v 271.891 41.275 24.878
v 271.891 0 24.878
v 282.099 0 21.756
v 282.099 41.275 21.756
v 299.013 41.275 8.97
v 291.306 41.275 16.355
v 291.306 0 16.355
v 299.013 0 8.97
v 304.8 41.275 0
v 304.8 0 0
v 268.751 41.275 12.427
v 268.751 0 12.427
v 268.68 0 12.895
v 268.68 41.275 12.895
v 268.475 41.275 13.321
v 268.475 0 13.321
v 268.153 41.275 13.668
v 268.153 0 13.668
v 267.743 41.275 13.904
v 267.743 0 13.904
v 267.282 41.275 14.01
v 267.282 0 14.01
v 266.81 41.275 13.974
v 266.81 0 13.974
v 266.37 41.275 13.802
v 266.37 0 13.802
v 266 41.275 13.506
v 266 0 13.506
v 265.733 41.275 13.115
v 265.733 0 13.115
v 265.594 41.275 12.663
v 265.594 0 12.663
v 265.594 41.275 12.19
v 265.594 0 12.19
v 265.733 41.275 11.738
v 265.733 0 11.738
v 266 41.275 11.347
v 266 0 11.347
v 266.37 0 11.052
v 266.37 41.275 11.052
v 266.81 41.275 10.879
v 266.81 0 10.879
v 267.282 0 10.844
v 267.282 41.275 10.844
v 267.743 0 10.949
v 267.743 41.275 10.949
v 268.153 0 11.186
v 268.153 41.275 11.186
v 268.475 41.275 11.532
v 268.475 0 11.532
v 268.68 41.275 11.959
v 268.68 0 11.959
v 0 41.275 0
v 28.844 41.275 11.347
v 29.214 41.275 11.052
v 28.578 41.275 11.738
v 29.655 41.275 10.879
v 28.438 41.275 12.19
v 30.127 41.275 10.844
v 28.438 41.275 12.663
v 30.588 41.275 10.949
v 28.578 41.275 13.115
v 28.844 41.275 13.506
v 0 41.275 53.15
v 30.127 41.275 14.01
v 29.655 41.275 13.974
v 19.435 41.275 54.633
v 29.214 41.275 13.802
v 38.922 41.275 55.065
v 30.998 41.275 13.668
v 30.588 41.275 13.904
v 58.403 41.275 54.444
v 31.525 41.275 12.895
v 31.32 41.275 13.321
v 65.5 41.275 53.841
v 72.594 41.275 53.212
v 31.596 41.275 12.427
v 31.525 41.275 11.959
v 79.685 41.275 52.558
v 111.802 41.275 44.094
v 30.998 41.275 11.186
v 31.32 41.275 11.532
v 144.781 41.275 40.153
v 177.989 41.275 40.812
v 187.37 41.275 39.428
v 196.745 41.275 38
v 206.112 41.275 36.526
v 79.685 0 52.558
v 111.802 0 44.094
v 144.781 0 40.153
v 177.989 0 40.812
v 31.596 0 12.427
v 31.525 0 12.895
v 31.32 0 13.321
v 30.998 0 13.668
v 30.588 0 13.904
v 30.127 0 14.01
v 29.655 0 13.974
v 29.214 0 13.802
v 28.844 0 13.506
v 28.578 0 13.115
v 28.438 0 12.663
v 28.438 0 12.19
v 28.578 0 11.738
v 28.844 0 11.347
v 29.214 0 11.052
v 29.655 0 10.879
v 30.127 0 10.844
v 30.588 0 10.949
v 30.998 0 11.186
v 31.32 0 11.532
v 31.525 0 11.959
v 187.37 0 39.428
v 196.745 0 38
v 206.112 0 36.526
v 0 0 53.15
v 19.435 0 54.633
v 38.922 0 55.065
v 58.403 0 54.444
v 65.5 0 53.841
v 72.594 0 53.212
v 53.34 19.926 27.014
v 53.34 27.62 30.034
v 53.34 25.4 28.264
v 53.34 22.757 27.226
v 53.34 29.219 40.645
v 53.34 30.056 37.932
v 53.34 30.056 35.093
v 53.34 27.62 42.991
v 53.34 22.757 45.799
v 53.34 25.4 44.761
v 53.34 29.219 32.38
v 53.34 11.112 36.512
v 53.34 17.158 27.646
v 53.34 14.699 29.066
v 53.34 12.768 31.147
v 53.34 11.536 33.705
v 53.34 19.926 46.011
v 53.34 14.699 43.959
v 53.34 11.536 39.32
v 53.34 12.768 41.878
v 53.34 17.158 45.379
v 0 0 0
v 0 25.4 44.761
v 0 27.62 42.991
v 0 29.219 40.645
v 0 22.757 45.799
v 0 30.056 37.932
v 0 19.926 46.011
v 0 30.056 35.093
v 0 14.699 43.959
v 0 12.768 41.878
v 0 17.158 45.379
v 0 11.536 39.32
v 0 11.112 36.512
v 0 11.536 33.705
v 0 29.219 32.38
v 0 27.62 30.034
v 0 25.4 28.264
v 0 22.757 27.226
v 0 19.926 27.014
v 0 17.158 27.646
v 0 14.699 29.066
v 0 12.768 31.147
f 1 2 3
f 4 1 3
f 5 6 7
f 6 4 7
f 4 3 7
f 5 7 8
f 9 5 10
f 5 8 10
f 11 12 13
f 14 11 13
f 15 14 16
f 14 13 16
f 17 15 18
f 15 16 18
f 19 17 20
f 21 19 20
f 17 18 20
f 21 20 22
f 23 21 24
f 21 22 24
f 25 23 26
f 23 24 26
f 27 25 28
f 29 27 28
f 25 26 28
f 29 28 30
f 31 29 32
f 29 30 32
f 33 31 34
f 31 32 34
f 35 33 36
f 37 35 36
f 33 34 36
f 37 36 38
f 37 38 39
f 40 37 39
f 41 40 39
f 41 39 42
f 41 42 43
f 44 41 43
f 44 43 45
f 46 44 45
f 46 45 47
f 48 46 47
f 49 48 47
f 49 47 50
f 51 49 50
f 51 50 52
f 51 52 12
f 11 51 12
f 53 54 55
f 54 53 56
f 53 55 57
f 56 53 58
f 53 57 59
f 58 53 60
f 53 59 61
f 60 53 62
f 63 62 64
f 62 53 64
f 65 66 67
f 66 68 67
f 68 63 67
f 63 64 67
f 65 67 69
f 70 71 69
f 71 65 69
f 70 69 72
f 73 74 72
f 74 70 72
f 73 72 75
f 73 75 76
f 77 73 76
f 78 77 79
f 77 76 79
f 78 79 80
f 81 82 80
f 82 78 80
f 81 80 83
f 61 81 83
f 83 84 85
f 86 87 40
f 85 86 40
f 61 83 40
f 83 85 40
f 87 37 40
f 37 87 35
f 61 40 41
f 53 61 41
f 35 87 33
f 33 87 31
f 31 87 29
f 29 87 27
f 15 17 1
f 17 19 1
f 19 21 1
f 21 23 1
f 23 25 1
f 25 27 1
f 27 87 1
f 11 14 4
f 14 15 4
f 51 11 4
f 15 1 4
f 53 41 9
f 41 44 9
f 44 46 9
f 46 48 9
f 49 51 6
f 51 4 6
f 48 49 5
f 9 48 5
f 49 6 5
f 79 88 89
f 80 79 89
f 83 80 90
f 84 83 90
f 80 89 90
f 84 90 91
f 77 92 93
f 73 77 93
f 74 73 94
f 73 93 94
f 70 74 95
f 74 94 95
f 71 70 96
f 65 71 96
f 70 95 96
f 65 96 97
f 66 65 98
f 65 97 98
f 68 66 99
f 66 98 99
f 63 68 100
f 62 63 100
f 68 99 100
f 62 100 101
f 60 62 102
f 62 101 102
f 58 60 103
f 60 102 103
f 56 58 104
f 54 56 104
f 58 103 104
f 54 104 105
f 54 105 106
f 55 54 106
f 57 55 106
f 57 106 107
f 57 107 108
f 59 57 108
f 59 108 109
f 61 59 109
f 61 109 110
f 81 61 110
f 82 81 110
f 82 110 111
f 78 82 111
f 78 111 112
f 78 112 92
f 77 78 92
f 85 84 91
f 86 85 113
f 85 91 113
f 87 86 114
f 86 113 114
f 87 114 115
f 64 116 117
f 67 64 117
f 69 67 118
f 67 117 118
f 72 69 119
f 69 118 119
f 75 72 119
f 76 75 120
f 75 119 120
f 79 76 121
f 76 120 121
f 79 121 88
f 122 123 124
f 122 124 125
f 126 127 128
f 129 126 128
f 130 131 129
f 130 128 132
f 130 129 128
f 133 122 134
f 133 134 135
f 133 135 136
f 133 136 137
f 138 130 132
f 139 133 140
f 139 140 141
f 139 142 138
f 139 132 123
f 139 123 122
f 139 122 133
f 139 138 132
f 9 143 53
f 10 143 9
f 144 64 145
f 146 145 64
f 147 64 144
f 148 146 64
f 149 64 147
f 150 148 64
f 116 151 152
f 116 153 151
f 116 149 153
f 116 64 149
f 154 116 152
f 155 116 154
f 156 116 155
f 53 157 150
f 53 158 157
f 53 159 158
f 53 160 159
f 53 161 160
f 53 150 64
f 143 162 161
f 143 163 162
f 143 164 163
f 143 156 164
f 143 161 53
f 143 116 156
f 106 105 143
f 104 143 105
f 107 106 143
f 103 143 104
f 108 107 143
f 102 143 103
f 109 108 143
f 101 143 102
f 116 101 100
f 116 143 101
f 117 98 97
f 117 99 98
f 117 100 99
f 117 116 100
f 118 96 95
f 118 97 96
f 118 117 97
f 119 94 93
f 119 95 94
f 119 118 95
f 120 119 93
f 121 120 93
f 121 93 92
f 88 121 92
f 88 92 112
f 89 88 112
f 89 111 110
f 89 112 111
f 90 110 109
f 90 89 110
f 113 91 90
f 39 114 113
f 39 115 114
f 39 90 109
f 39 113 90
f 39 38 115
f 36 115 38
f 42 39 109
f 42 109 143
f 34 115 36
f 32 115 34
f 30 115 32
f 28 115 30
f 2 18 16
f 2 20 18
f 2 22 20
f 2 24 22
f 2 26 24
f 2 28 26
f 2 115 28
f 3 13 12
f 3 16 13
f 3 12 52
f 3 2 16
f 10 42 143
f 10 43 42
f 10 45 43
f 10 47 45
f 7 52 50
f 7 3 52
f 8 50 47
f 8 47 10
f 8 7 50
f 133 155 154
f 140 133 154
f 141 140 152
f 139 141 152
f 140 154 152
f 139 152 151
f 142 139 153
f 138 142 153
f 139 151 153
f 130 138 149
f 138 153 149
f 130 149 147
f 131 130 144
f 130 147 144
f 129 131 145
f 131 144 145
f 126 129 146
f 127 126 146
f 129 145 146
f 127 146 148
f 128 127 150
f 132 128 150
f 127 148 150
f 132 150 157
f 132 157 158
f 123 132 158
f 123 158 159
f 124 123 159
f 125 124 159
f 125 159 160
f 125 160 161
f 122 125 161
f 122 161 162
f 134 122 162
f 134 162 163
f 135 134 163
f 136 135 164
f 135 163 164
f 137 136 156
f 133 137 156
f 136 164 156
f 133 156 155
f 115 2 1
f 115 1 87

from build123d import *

# Parameters (mm, degrees)
F1_DEPTH = 41.275
F2_R     = 9.525
F3_DEPTH = 53.34
F5_DEPTH = 41.656
F7_DEPTH = 42.164
F8_R     = 1.5875
F9_DEPTH = 41.656


with BuildPart() as f1:
    # F0 (on Front) → F1 (new body)
    with BuildSketch(Plane.XZ):
        Polygon((304.8, 0), (304.8, 19.05), (0, 73.025), (0, 0), align=None)
    extrude(amount=-F1_DEPTH)

    # F2 (on face) → F3 (cut)
    with BuildSketch(Plane(origin=(0, 0, 0), x_dir=(0, -1, 0), z_dir=(-1, 0, 0))):
        with Locations((-20.6375, 36.5125)):
            Circle(F2_R)
    extrude(amount=-F3_DEPTH, mode=Mode.SUBTRACT)

    # F4 (on face) → F5 (cut)
    with BuildSketch(Plane.XZ):
        with BuildLine():
            ThreePointArc((0, 58.4309995174), (103.3439877315, 50.1875204766), (206.112158097, 36.5259720036))
            Line((206.112158097, 36.5259720036), (0, 73.025))
            Line((0, 73.025), (0, 58.4309995174))
        make_face()
        with BuildLine():
            Line((304.8, 19.05), (271.8913928646, 24.8775658469))
            ThreePointArc((271.8913928646, 24.8775658469), (291.3064644297, 16.355353839), (304.8, 0))
            Line((304.8, 0), (304.8, 19.05))
        make_face()
    extrude(amount=-F5_DEPTH, mode=Mode.SUBTRACT)

    # F6 (on face) → F7 (cut)
    with BuildSketch(Plane.XZ):
        with BuildLine():
            ThreePointArc((0, 53.1503558159), (29.1755322562, 54.9802482596), (58.4034793796, 54.4442484998))
            ThreePointArc((58.4034793796, 54.4442484998), (29.216529401, 56.6542842892), (0, 58.4309995174))
            Line((0, 58.4309995174), (0, 53.1503558159))
        make_face()
        with BuildLine():
            ThreePointArc((177.9886173747, 40.8118412298), (128.9105515624, 47.3016400104), (79.6850837991, 52.5578131014))
            ThreePointArc((79.6850837991, 52.5578131014), (128.2234853746, 41.5514956376), (177.9886173747, 40.8118412298))
        make_face()
    extrude(amount=-F7_DEPTH, mode=Mode.SUBTRACT)

    # F8 (on face) → F9 (cut)
    with BuildSketch(Plane.XZ):
        with Locations((30.00802733, 12.426703237)):
            Circle(F8_R)
        with Locations((267.163425684, 12.426703237)):
            Circle(F8_R)
    extrude(amount=-F9_DEPTH, mode=Mode.SUBTRACT)


solid = f1.part
